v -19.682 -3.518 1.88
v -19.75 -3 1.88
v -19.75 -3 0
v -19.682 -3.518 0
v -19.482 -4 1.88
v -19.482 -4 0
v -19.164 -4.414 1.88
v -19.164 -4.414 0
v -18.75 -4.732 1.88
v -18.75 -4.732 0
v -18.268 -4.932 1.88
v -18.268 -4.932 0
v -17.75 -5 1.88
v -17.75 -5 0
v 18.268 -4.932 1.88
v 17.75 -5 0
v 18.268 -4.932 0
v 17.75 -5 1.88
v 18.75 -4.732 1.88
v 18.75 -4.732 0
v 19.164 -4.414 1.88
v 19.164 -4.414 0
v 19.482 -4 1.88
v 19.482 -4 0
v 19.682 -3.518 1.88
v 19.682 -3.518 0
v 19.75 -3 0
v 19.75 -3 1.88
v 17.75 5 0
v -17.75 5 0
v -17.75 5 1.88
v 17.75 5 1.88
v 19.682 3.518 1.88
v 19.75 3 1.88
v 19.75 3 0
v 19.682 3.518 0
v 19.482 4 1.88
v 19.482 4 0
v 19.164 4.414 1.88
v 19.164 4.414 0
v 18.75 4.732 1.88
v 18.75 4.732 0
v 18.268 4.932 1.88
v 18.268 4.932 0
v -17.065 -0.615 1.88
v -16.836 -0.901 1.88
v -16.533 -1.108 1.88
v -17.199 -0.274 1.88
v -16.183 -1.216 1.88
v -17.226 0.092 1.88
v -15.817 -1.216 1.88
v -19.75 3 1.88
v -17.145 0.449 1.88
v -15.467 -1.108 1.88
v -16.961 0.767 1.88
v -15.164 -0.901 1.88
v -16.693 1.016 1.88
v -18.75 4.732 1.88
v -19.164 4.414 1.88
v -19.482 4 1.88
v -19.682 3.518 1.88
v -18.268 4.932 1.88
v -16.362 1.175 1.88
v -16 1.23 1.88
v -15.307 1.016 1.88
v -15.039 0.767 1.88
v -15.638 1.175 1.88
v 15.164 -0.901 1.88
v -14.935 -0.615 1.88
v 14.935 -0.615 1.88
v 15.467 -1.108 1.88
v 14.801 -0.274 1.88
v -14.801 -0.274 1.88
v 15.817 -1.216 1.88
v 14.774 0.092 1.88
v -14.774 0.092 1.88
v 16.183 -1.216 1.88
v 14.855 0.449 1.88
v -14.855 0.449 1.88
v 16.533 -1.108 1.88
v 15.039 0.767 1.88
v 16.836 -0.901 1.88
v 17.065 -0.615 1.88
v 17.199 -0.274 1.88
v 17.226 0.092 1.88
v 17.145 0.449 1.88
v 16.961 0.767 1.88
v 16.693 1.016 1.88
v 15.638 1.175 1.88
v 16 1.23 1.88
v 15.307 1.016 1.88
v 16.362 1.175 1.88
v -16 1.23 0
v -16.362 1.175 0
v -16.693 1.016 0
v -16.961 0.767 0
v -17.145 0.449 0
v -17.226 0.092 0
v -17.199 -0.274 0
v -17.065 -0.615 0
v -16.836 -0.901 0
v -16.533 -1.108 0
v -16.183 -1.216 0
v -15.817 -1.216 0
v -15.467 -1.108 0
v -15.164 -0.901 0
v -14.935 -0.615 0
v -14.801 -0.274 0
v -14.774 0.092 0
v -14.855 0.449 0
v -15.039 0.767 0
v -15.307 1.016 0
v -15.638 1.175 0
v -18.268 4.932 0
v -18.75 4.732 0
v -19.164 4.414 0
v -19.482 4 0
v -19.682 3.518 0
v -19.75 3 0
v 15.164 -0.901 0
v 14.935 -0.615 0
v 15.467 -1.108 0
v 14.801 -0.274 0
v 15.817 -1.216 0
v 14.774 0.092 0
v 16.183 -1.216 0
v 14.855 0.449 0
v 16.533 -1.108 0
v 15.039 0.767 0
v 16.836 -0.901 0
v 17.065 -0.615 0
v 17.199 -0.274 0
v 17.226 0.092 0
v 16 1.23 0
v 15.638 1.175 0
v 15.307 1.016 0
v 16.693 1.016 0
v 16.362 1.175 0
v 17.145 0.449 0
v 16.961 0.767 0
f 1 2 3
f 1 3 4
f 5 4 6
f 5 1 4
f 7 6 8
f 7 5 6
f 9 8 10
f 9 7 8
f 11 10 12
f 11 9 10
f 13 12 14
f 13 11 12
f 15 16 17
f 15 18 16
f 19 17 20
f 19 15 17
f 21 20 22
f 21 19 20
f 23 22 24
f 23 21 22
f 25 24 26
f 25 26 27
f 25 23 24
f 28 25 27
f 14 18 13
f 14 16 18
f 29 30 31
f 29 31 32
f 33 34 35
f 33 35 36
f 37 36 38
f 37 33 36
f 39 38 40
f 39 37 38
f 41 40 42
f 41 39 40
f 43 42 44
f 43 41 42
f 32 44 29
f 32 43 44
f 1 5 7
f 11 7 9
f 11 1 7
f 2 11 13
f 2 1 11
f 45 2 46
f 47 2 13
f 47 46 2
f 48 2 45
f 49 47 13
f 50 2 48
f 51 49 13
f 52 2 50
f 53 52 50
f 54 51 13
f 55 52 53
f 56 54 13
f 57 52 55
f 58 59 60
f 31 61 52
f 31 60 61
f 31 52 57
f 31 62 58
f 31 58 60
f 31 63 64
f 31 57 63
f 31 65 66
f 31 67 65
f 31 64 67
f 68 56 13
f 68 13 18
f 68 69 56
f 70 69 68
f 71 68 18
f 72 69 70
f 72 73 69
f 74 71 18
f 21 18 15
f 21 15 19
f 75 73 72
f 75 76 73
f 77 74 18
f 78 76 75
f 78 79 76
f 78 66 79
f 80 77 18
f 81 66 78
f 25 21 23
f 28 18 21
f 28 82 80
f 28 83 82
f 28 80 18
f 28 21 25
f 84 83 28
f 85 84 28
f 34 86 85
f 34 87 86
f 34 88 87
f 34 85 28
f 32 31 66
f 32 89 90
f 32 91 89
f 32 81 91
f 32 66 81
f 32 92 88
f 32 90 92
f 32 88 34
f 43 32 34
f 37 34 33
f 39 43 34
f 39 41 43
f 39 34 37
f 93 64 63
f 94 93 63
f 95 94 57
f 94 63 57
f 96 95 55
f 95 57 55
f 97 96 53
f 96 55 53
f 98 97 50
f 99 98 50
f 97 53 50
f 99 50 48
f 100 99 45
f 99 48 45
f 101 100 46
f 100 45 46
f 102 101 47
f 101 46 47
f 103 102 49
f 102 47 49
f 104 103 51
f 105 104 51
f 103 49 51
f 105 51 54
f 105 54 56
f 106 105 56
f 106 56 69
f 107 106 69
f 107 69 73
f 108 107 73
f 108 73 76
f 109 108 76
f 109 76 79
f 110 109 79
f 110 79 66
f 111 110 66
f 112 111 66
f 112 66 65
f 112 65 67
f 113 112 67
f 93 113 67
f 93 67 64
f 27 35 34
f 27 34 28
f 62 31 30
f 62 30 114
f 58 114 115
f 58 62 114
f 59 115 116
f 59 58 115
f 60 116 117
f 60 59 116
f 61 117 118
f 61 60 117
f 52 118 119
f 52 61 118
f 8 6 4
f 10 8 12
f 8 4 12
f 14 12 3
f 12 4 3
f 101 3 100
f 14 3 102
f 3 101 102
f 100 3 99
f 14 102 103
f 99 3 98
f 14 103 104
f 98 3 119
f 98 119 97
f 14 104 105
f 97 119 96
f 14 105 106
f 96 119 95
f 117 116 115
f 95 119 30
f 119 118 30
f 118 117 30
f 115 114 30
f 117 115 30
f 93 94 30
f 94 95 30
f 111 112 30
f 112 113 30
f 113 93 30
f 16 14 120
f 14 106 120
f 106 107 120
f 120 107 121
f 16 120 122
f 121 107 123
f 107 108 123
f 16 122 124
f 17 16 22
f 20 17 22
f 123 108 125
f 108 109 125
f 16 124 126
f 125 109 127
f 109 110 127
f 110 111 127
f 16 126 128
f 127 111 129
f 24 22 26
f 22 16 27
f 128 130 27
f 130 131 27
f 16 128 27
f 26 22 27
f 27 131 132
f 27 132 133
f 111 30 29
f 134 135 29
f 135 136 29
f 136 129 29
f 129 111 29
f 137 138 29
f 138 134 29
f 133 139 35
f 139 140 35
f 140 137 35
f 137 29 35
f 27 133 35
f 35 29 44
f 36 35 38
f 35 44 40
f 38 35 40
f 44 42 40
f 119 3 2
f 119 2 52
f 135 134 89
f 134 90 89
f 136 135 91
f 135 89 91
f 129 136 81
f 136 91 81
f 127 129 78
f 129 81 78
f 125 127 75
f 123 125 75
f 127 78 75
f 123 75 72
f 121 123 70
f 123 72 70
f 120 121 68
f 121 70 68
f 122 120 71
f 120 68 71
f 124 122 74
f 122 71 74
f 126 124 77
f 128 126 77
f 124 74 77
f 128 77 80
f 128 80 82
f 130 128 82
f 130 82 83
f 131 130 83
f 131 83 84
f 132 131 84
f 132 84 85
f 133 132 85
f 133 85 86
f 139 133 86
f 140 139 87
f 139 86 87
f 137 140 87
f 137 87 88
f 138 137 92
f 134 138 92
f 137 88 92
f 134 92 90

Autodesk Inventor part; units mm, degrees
ref_plane "YZ Plane" through (0, 0, 0) normal (1, 0, 0) x (0, 1, 0)
ref_plane "XZ Plane" through (0, 0, 0) normal (0, 1, 0) x (-1, 0, 0)
ref_plane "XY Plane" through (0, 0, 0) normal (0, 0, 1) x (1, 0, 0)
sketch "Sketch1" plane through (0, 0, 0) normal (0, 0, 1) x (1, 0, 0)
  line L0 (19.75, -5) -> (-19.75, -5)
  line L1 (-19.75, -5) -> (-19.75, 5)
  line L2 (-19.75, 5) -> (19.75, 5)
  line L3 (19.75, 5) -> (19.75, -5)
  line L4 (19.75, -5) -> (-19.75, 5) construction
  line L5 (-19.75, -5) -> (19.75, 5) construction
  line L6 (16, 0) -> (-16, 0) construction
  point P0 (0, 0)
  point P1 (0, 5)
  point P2 (0, 0)
  dimension "d0" = 39.5
  dimension "d1" = 10
  dimension "d6" = 32
extrude "Extrusion1" add sketch "Sketch1" along normal blind 1.8796
fillet "Fillet1" radius 2 4 edges at (-19.75, 5, 0.9398) (-19.75, -5, 0.9398) (19.75, -5, 0.9398) (19.75, 5, 0.9398)
hole "Hole1" at (16, 0, 0) at (-16, 0, 0) direction (0, 0, 1) diameter 2.459 end through all thread size "M3x0.5" class "6H" standard "ANSI Metric M Profile"
properties part number "Cowling Magnetic Catch" material "Steel, Carbon"
